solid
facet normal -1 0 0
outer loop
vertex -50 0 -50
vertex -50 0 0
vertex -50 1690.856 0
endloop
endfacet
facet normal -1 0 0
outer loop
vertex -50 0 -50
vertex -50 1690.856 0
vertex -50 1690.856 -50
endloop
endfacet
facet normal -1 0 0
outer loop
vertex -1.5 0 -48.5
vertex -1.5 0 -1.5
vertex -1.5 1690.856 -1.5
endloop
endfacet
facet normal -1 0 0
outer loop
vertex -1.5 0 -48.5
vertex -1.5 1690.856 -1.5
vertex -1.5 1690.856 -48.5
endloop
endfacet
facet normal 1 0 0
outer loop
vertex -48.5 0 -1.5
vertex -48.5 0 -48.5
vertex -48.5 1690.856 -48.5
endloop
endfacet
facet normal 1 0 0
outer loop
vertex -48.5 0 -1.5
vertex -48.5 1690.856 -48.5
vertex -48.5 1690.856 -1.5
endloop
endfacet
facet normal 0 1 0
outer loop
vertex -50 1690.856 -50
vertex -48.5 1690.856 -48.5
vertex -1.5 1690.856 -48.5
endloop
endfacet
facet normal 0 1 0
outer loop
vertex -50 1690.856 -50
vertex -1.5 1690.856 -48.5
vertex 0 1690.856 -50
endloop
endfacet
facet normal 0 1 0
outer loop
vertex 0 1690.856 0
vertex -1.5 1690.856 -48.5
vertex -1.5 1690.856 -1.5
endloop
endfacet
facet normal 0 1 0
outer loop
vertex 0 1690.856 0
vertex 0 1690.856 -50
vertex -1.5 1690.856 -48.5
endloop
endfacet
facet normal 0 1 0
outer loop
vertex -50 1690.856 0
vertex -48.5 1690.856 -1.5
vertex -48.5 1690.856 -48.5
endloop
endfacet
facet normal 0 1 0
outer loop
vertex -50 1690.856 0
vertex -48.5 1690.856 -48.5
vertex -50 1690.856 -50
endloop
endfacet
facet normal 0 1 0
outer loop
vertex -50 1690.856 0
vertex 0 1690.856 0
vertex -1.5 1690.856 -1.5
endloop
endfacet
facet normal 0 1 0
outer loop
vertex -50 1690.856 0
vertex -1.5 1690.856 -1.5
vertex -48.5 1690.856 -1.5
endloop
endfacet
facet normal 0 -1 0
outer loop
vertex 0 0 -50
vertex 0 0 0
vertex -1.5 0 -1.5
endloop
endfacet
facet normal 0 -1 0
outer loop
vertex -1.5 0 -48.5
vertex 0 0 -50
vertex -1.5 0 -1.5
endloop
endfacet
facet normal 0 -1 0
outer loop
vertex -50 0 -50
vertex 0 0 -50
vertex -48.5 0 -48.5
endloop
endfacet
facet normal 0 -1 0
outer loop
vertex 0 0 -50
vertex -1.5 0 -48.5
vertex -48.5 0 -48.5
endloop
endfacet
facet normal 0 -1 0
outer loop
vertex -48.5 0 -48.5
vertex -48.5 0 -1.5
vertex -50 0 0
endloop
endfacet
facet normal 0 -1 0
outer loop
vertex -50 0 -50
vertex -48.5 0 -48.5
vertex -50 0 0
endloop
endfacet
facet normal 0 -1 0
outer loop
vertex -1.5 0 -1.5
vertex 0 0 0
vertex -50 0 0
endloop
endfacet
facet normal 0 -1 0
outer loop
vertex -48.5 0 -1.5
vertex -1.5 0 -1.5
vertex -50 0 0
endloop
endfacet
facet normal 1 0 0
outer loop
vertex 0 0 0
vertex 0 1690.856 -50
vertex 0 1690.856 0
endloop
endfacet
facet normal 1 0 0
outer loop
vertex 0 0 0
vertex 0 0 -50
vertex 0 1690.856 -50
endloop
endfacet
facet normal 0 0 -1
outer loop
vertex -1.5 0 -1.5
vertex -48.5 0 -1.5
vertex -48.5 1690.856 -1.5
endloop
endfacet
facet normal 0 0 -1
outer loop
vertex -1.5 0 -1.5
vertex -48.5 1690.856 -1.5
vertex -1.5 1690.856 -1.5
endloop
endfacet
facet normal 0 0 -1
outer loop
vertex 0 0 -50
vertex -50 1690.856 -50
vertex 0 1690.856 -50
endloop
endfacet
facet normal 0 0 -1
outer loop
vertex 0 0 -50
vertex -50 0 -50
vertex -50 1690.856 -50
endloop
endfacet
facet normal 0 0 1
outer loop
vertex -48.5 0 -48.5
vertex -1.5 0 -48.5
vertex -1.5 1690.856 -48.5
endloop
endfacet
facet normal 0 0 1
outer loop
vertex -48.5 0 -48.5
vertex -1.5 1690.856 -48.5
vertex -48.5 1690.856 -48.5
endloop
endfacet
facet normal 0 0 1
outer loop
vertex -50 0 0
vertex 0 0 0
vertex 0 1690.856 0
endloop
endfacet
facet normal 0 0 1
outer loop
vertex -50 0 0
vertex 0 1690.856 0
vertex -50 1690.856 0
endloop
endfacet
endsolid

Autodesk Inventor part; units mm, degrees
ref_plane "YZ Plane" through (0, 0, 0) normal (1, 0, 0) x (0, 1, 0)
ref_plane "XZ Plane" through (0, 0, 0) normal (0, 1, 0) x (-1, 0, 0)
ref_plane "XY Plane" through (0, 0, 0) normal (0, 0, 1) x (1, 0, 0)
sketch "Boceto1" plane through (0, 0, 0) normal (0, 1, 0) x (-1, 0, 0)
  line L0 (0, 0) -> (50, 0)
  line L1 (50, 0) -> (50, -50)
  line L2 (50, -50) -> (0, -50)
  line L3 (0, -50) -> (0, 0)
  line L4 (1.5, -48.5) -> (48.5, -48.5)
  line L5 (48.5, -48.5) -> (48.5, -1.5)
  line L6 (48.5, -1.5) -> (1.5, -1.5)
  line L7 (1.5, -1.5) -> (1.5, -48.5)
  line L8 (1.5, -48.5) -> (48.5, -1.5) construction
  line L9 (48.5, -48.5) -> (1.5, -1.5) construction
  point P0 (25, -25)
  dimension "d0" = 50
  dimension "d1" = 50
  dimension "d6" = 1.5
  dimension "d7" = 1.5
  dimension "d8" = 1.5
  dimension "d9" = 1.5
extrude "Extrusión1" add sketch "Boceto1" along normal blind 1690.856
equation "\"d0\" = d1"
equation "\"d7\" = d6"
equation "\"d8\" = d6"
equation "\"d9\" = d6"
properties part number "Mesa_base3"
